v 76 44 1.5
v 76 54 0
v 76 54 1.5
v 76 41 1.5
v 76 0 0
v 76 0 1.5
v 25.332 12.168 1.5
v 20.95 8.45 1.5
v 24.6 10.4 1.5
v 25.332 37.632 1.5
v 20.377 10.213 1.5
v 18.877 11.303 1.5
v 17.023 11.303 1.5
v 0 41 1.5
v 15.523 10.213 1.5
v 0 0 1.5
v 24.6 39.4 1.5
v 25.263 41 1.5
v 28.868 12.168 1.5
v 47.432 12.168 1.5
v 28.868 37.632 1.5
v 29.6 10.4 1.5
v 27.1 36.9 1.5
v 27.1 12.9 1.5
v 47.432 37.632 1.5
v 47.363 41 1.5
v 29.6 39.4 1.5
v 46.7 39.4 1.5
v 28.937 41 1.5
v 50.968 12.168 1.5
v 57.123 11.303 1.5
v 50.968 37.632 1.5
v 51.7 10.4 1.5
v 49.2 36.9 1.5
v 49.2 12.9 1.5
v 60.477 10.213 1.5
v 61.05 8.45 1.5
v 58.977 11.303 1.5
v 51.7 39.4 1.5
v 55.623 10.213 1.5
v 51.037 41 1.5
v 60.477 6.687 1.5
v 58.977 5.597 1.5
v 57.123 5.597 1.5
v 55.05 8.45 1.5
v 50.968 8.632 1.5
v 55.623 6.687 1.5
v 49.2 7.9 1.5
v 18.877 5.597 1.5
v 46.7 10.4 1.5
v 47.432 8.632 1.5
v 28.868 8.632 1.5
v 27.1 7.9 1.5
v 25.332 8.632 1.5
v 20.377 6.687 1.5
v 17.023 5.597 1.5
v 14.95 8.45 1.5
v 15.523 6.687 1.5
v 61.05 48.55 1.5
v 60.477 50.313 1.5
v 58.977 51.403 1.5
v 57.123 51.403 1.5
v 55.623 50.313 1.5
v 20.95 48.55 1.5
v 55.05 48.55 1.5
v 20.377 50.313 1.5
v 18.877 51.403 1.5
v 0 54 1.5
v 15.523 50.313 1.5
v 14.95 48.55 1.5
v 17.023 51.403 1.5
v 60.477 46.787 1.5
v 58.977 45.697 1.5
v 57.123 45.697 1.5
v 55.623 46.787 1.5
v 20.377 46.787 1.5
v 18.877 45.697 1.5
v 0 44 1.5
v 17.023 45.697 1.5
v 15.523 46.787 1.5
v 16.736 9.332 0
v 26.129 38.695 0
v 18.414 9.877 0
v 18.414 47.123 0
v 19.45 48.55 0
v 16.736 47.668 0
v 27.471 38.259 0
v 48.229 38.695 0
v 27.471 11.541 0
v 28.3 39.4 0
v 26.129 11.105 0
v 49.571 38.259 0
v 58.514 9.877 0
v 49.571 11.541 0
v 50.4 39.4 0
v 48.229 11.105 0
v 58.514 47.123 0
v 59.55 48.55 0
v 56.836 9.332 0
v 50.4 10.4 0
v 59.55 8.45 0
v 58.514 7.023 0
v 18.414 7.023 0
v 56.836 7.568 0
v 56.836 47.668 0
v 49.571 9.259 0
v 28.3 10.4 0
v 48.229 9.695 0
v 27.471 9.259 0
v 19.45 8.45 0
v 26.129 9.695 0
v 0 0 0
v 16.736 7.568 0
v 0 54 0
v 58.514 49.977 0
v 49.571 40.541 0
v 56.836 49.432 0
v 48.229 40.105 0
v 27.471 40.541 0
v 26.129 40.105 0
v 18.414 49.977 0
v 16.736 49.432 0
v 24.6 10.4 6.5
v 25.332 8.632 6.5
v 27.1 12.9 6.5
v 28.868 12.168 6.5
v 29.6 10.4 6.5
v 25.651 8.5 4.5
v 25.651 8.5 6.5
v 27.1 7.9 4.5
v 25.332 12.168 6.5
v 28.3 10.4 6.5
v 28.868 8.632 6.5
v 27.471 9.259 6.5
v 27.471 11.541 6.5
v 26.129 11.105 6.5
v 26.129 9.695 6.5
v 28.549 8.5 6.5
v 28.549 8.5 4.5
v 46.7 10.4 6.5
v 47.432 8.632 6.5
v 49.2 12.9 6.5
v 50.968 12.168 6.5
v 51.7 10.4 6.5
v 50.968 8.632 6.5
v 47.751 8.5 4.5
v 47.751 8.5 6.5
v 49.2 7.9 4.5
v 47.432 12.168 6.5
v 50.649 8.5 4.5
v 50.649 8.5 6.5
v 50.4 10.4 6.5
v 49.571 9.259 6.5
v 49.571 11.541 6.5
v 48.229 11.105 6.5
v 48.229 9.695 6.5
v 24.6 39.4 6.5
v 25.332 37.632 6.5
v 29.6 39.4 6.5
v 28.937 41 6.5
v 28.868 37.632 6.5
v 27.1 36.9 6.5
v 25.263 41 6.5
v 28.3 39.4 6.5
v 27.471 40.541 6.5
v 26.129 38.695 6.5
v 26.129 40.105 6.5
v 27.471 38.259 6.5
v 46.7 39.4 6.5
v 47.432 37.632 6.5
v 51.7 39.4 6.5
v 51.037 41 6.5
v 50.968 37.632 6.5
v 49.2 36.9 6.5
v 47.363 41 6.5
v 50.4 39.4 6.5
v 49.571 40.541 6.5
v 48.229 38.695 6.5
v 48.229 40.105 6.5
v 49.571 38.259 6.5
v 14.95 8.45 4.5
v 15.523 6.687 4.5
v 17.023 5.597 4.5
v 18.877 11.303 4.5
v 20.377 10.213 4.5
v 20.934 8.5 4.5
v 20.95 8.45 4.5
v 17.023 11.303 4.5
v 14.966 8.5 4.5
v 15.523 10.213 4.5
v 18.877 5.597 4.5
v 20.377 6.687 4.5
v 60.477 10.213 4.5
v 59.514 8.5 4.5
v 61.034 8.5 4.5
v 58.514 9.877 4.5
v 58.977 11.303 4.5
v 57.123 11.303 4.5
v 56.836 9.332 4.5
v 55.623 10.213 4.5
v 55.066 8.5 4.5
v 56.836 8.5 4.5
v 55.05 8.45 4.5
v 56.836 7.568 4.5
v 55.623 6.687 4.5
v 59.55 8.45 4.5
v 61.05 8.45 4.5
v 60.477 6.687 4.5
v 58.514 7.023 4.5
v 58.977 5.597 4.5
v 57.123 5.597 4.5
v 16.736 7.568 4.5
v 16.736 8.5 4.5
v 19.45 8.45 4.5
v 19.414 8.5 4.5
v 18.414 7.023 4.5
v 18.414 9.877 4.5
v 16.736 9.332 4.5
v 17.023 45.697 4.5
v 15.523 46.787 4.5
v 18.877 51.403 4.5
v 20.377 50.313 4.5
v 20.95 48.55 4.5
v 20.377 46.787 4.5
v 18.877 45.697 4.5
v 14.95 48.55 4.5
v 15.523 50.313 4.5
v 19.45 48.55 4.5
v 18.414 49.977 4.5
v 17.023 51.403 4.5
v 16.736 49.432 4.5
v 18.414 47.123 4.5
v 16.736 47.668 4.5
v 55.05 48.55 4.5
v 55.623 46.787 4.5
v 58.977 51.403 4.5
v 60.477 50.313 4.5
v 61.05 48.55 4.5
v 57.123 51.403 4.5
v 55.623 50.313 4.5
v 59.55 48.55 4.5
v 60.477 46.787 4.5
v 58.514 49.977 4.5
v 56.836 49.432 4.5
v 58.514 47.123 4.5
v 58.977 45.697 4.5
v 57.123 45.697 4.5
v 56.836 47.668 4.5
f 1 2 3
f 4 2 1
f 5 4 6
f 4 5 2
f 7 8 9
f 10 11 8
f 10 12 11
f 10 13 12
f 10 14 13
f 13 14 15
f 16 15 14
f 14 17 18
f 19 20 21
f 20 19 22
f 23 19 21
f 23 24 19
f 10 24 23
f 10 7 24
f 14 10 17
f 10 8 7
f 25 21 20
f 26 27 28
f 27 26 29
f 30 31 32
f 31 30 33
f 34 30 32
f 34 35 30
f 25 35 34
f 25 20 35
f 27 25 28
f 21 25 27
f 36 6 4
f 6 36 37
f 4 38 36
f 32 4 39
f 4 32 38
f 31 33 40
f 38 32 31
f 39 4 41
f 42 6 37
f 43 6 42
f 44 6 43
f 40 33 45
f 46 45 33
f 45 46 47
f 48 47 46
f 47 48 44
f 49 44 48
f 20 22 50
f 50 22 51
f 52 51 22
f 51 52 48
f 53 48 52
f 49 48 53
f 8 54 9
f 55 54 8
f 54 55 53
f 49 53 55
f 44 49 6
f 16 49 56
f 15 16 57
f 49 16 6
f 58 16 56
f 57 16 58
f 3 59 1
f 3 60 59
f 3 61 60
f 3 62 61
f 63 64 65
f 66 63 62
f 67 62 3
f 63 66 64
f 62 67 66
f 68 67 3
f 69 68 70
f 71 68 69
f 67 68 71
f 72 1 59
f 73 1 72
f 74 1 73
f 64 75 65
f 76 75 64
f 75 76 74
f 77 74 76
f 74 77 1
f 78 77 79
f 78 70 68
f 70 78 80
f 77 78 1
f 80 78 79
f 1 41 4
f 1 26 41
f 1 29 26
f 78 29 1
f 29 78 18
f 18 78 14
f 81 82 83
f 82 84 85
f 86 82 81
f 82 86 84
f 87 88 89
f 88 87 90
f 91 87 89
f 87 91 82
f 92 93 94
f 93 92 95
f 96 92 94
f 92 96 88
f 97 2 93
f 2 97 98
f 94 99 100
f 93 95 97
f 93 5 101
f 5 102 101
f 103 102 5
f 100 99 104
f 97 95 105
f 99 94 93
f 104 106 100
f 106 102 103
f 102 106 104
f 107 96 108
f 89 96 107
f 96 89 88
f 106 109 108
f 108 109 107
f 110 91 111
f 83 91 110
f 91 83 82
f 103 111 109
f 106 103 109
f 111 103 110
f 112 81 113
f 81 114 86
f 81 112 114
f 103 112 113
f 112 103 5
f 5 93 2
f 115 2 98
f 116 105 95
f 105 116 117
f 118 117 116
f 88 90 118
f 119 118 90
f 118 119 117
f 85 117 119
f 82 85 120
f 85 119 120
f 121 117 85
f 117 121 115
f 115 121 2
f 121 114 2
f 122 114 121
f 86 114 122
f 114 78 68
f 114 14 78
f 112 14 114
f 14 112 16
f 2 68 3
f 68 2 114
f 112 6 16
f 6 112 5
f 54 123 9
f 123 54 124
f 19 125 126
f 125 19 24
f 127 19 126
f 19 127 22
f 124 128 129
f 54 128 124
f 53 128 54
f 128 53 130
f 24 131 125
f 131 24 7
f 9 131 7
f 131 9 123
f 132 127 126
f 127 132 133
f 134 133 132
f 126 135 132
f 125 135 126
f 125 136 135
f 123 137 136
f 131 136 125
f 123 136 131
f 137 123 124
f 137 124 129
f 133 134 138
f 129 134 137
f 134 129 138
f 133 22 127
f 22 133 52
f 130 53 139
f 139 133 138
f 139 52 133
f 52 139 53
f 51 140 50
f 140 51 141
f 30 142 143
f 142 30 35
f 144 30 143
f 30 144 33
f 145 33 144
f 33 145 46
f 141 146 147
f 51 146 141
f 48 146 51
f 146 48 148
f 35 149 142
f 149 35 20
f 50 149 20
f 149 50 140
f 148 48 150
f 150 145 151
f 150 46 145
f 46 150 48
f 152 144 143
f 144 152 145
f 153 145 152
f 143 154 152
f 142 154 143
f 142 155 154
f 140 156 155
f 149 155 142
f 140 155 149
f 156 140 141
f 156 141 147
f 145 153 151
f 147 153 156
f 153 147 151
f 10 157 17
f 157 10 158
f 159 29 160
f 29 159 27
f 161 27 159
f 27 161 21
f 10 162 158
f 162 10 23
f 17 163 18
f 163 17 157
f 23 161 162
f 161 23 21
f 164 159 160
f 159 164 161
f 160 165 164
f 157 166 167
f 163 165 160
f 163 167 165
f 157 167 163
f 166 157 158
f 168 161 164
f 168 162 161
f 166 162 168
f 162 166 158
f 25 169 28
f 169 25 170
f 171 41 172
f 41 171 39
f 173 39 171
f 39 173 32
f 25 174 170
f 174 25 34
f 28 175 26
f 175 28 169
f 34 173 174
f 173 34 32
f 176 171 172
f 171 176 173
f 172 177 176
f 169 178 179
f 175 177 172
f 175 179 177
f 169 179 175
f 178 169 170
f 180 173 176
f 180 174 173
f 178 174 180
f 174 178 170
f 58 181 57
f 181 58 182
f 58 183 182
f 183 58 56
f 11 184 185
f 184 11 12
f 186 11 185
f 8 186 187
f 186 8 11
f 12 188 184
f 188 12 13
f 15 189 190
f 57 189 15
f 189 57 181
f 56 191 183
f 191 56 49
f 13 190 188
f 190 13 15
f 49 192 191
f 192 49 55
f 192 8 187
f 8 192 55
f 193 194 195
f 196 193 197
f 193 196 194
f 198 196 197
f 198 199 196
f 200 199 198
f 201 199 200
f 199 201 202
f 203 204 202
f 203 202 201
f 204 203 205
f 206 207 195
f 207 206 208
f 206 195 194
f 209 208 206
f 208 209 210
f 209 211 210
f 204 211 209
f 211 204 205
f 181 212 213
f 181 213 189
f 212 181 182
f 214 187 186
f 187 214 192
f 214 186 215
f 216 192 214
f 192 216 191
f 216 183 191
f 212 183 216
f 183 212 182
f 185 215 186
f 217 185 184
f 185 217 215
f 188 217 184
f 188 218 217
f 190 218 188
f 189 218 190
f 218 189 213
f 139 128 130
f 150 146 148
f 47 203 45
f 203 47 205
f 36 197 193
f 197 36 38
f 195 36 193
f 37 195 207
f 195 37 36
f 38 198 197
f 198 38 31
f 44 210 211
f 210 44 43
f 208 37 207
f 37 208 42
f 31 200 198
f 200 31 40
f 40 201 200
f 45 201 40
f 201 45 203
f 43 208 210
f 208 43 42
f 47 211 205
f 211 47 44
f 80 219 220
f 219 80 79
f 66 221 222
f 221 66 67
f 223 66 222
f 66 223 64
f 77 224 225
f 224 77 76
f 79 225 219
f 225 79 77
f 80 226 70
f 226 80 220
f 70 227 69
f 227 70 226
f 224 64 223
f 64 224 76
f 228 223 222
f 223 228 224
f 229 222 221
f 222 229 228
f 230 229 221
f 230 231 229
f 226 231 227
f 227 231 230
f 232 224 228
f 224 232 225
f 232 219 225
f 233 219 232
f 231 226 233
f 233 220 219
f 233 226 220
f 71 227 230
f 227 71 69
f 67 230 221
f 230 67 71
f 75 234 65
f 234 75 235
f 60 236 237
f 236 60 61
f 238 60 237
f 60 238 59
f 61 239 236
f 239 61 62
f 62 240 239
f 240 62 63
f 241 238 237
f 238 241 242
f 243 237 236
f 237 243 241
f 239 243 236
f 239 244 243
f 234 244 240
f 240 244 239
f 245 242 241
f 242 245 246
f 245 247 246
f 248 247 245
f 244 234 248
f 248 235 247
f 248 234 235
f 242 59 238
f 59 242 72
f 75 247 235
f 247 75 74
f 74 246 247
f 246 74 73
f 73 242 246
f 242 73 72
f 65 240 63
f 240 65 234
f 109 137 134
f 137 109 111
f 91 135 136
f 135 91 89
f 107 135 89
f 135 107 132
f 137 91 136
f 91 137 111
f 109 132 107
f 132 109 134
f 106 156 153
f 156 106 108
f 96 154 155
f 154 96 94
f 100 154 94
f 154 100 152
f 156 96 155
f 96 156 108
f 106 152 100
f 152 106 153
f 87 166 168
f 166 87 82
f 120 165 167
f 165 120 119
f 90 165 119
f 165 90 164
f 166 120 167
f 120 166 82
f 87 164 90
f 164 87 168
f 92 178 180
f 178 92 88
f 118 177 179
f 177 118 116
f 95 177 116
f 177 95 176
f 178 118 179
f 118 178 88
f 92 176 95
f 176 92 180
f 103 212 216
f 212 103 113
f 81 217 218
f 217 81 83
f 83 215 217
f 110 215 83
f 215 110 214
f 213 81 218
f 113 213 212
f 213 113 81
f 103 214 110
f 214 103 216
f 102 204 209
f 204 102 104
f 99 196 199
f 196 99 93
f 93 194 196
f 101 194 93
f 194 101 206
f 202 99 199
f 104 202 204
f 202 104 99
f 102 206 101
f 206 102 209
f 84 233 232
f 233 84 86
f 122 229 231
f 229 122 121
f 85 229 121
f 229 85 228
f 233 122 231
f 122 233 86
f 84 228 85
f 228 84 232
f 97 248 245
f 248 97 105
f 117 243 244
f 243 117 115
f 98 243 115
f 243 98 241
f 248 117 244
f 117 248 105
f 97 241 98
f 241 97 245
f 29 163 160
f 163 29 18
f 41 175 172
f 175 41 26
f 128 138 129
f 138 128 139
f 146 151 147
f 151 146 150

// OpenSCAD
// Plate
plateX = 76;
plateY = 54;
plateZThickness = 1.5;

plateXZero = 38;
plateYZero = 28.5;


//RoboPhilo mount variables
//Screw Hole size is to allow screws to pass through without biting
rpScrewHoleSize = 1.2; //really radius

rpXLeft = 26 + 1.1;
rpXRight = 48.1 + 1.1;
rpXMidSpace = 20;

rpYBottom = 9.3 + 1.1;
rpYTop = 38.3 + 1.1;
rpYMidSpace = 27;

rpScrewMountZ = 5;
rpScrewmountDiameter = 2.5;  //really radius

//ezRobot mount variables
//Screw hole size here is to allow #4 screws to bite into it
//You can change the screwhole size and the hole will stay in the same position
ezrScrewHoleSize = 1.5; //really radius
ezrOffset = 17.5 + 2.55; //2.55 is the center of the hole on teh ezbv4
ezrScrewMountZ = 3;
ezrScrewMountDiameter = 3; //really radius

difference(){
union(){
// Plate
cube([plateX,plateY,plateZThickness]);

//RoboPhilo screw mounts
//fixed position based on the actual plate
//lower left
color([1,0,0])
translate([rpXLeft,rpYBottom,plateZThickness])
cylinder(rpScrewMountZ,rpScrewmountDiameter,rpScrewmountDiameter);

//lower right
color([1,0,0])
translate([rpXRight,rpYBottom,plateZThickness])
cylinder(rpScrewMountZ,rpScrewmountDiameter,rpScrewmountDiameter);

//upper left
color([1,0,0])
translate([rpXLeft,rpYTop,plateZThickness])
cylinder(rpScrewMountZ,rpScrewmountDiameter,rpScrewmountDiameter);

//upper right
color([1,0,0])
translate([rpXRight,rpYTop,plateZThickness])
cylinder(rpScrewMountZ,rpScrewmountDiameter,rpScrewmountDiameter);

//EZ Robot Screw mounts
//calculated based on the center coordinates of the plate
//lower left
color([0,1,0])
translate([plateXZero-ezrOffset,plateYZero-ezrOffset,plateZThickness])
cylinder(ezrScrewMountZ,ezrScrewMountDiameter,ezrScrewMountDiameter);

//lower right
color([0,1,0])
translate([plateXZero+ezrOffset,plateYZero-ezrOffset,plateZThickness])
cylinder(ezrScrewMountZ,ezrScrewMountDiameter,ezrScrewMountDiameter);

//upper left
color([0,1,0])
translate([plateXZero-ezrOffset,plateYZero+ezrOffset,plateZThickness])
cylinder(ezrScrewMountZ,ezrScrewMountDiameter,ezrScrewMountDiameter);

//upper right
color([0,1,0])
translate([plateXZero+ezrOffset,plateYZero+ezrOffset,plateZThickness])
cylinder(ezrScrewMountZ,ezrScrewMountDiameter,ezrScrewMountDiameter);

} //end union() of plate



//mount holes to mount to RoboPhilo
//lower left
color([0,0,1])
translate([rpXLeft,rpYBottom,-1])
cylinder(10,rpScrewHoleSize,rpScrewHoleSize);

//lower right
color([0,0,1])
translate([rpXRight,rpYBottom,-1])
cylinder(10,rpScrewHoleSize,rpScrewHoleSize);

//upper left
color([0,0,1])
translate([rpXLeft,rpYTop,-1])
cylinder(10,rpScrewHoleSize,rpScrewHoleSize);

//upper right
color([0,0,1])
translate([rpXRight,rpYTop,-1])
cylinder(10,rpScrewHoleSize,rpScrewHoleSize);

//EZ Robot Screw holes
//lower left
color([0,0,1])
translate([plateXZero-ezrOffset,plateYZero-ezrOffset, -1])
cylinder(10,ezrScrewHoleSize,ezrScrewHoleSize);

//lower right
color([0,0,1])
translate([plateXZero+ezrOffset,plateYZero-ezrOffset, -1])
cylinder(10,ezrScrewHoleSize,ezrScrewHoleSize);

//upper left
color([0,0,1])
translate([plateXZero-ezrOffset,plateYZero+ezrOffset, -1])
cylinder(10,ezrScrewHoleSize,ezrScrewHoleSize);

//upper right
color([0,0,1])
translate([plateXZero+ezrOffset,plateYZero+ezrOffset, -1])
cylinder(10,ezrScrewHoleSize,ezrScrewHoleSize);

//top cutoff
color([1,1,0])
translate([0,plateY-13,plateZThickness])
cube([plateX,3,10]);

//bottom cutoff
color([1,1,0])
translate([0,4.5,plateZThickness+ezrScrewMountZ])
cube([plateX,4,10]);

} // end difference()
